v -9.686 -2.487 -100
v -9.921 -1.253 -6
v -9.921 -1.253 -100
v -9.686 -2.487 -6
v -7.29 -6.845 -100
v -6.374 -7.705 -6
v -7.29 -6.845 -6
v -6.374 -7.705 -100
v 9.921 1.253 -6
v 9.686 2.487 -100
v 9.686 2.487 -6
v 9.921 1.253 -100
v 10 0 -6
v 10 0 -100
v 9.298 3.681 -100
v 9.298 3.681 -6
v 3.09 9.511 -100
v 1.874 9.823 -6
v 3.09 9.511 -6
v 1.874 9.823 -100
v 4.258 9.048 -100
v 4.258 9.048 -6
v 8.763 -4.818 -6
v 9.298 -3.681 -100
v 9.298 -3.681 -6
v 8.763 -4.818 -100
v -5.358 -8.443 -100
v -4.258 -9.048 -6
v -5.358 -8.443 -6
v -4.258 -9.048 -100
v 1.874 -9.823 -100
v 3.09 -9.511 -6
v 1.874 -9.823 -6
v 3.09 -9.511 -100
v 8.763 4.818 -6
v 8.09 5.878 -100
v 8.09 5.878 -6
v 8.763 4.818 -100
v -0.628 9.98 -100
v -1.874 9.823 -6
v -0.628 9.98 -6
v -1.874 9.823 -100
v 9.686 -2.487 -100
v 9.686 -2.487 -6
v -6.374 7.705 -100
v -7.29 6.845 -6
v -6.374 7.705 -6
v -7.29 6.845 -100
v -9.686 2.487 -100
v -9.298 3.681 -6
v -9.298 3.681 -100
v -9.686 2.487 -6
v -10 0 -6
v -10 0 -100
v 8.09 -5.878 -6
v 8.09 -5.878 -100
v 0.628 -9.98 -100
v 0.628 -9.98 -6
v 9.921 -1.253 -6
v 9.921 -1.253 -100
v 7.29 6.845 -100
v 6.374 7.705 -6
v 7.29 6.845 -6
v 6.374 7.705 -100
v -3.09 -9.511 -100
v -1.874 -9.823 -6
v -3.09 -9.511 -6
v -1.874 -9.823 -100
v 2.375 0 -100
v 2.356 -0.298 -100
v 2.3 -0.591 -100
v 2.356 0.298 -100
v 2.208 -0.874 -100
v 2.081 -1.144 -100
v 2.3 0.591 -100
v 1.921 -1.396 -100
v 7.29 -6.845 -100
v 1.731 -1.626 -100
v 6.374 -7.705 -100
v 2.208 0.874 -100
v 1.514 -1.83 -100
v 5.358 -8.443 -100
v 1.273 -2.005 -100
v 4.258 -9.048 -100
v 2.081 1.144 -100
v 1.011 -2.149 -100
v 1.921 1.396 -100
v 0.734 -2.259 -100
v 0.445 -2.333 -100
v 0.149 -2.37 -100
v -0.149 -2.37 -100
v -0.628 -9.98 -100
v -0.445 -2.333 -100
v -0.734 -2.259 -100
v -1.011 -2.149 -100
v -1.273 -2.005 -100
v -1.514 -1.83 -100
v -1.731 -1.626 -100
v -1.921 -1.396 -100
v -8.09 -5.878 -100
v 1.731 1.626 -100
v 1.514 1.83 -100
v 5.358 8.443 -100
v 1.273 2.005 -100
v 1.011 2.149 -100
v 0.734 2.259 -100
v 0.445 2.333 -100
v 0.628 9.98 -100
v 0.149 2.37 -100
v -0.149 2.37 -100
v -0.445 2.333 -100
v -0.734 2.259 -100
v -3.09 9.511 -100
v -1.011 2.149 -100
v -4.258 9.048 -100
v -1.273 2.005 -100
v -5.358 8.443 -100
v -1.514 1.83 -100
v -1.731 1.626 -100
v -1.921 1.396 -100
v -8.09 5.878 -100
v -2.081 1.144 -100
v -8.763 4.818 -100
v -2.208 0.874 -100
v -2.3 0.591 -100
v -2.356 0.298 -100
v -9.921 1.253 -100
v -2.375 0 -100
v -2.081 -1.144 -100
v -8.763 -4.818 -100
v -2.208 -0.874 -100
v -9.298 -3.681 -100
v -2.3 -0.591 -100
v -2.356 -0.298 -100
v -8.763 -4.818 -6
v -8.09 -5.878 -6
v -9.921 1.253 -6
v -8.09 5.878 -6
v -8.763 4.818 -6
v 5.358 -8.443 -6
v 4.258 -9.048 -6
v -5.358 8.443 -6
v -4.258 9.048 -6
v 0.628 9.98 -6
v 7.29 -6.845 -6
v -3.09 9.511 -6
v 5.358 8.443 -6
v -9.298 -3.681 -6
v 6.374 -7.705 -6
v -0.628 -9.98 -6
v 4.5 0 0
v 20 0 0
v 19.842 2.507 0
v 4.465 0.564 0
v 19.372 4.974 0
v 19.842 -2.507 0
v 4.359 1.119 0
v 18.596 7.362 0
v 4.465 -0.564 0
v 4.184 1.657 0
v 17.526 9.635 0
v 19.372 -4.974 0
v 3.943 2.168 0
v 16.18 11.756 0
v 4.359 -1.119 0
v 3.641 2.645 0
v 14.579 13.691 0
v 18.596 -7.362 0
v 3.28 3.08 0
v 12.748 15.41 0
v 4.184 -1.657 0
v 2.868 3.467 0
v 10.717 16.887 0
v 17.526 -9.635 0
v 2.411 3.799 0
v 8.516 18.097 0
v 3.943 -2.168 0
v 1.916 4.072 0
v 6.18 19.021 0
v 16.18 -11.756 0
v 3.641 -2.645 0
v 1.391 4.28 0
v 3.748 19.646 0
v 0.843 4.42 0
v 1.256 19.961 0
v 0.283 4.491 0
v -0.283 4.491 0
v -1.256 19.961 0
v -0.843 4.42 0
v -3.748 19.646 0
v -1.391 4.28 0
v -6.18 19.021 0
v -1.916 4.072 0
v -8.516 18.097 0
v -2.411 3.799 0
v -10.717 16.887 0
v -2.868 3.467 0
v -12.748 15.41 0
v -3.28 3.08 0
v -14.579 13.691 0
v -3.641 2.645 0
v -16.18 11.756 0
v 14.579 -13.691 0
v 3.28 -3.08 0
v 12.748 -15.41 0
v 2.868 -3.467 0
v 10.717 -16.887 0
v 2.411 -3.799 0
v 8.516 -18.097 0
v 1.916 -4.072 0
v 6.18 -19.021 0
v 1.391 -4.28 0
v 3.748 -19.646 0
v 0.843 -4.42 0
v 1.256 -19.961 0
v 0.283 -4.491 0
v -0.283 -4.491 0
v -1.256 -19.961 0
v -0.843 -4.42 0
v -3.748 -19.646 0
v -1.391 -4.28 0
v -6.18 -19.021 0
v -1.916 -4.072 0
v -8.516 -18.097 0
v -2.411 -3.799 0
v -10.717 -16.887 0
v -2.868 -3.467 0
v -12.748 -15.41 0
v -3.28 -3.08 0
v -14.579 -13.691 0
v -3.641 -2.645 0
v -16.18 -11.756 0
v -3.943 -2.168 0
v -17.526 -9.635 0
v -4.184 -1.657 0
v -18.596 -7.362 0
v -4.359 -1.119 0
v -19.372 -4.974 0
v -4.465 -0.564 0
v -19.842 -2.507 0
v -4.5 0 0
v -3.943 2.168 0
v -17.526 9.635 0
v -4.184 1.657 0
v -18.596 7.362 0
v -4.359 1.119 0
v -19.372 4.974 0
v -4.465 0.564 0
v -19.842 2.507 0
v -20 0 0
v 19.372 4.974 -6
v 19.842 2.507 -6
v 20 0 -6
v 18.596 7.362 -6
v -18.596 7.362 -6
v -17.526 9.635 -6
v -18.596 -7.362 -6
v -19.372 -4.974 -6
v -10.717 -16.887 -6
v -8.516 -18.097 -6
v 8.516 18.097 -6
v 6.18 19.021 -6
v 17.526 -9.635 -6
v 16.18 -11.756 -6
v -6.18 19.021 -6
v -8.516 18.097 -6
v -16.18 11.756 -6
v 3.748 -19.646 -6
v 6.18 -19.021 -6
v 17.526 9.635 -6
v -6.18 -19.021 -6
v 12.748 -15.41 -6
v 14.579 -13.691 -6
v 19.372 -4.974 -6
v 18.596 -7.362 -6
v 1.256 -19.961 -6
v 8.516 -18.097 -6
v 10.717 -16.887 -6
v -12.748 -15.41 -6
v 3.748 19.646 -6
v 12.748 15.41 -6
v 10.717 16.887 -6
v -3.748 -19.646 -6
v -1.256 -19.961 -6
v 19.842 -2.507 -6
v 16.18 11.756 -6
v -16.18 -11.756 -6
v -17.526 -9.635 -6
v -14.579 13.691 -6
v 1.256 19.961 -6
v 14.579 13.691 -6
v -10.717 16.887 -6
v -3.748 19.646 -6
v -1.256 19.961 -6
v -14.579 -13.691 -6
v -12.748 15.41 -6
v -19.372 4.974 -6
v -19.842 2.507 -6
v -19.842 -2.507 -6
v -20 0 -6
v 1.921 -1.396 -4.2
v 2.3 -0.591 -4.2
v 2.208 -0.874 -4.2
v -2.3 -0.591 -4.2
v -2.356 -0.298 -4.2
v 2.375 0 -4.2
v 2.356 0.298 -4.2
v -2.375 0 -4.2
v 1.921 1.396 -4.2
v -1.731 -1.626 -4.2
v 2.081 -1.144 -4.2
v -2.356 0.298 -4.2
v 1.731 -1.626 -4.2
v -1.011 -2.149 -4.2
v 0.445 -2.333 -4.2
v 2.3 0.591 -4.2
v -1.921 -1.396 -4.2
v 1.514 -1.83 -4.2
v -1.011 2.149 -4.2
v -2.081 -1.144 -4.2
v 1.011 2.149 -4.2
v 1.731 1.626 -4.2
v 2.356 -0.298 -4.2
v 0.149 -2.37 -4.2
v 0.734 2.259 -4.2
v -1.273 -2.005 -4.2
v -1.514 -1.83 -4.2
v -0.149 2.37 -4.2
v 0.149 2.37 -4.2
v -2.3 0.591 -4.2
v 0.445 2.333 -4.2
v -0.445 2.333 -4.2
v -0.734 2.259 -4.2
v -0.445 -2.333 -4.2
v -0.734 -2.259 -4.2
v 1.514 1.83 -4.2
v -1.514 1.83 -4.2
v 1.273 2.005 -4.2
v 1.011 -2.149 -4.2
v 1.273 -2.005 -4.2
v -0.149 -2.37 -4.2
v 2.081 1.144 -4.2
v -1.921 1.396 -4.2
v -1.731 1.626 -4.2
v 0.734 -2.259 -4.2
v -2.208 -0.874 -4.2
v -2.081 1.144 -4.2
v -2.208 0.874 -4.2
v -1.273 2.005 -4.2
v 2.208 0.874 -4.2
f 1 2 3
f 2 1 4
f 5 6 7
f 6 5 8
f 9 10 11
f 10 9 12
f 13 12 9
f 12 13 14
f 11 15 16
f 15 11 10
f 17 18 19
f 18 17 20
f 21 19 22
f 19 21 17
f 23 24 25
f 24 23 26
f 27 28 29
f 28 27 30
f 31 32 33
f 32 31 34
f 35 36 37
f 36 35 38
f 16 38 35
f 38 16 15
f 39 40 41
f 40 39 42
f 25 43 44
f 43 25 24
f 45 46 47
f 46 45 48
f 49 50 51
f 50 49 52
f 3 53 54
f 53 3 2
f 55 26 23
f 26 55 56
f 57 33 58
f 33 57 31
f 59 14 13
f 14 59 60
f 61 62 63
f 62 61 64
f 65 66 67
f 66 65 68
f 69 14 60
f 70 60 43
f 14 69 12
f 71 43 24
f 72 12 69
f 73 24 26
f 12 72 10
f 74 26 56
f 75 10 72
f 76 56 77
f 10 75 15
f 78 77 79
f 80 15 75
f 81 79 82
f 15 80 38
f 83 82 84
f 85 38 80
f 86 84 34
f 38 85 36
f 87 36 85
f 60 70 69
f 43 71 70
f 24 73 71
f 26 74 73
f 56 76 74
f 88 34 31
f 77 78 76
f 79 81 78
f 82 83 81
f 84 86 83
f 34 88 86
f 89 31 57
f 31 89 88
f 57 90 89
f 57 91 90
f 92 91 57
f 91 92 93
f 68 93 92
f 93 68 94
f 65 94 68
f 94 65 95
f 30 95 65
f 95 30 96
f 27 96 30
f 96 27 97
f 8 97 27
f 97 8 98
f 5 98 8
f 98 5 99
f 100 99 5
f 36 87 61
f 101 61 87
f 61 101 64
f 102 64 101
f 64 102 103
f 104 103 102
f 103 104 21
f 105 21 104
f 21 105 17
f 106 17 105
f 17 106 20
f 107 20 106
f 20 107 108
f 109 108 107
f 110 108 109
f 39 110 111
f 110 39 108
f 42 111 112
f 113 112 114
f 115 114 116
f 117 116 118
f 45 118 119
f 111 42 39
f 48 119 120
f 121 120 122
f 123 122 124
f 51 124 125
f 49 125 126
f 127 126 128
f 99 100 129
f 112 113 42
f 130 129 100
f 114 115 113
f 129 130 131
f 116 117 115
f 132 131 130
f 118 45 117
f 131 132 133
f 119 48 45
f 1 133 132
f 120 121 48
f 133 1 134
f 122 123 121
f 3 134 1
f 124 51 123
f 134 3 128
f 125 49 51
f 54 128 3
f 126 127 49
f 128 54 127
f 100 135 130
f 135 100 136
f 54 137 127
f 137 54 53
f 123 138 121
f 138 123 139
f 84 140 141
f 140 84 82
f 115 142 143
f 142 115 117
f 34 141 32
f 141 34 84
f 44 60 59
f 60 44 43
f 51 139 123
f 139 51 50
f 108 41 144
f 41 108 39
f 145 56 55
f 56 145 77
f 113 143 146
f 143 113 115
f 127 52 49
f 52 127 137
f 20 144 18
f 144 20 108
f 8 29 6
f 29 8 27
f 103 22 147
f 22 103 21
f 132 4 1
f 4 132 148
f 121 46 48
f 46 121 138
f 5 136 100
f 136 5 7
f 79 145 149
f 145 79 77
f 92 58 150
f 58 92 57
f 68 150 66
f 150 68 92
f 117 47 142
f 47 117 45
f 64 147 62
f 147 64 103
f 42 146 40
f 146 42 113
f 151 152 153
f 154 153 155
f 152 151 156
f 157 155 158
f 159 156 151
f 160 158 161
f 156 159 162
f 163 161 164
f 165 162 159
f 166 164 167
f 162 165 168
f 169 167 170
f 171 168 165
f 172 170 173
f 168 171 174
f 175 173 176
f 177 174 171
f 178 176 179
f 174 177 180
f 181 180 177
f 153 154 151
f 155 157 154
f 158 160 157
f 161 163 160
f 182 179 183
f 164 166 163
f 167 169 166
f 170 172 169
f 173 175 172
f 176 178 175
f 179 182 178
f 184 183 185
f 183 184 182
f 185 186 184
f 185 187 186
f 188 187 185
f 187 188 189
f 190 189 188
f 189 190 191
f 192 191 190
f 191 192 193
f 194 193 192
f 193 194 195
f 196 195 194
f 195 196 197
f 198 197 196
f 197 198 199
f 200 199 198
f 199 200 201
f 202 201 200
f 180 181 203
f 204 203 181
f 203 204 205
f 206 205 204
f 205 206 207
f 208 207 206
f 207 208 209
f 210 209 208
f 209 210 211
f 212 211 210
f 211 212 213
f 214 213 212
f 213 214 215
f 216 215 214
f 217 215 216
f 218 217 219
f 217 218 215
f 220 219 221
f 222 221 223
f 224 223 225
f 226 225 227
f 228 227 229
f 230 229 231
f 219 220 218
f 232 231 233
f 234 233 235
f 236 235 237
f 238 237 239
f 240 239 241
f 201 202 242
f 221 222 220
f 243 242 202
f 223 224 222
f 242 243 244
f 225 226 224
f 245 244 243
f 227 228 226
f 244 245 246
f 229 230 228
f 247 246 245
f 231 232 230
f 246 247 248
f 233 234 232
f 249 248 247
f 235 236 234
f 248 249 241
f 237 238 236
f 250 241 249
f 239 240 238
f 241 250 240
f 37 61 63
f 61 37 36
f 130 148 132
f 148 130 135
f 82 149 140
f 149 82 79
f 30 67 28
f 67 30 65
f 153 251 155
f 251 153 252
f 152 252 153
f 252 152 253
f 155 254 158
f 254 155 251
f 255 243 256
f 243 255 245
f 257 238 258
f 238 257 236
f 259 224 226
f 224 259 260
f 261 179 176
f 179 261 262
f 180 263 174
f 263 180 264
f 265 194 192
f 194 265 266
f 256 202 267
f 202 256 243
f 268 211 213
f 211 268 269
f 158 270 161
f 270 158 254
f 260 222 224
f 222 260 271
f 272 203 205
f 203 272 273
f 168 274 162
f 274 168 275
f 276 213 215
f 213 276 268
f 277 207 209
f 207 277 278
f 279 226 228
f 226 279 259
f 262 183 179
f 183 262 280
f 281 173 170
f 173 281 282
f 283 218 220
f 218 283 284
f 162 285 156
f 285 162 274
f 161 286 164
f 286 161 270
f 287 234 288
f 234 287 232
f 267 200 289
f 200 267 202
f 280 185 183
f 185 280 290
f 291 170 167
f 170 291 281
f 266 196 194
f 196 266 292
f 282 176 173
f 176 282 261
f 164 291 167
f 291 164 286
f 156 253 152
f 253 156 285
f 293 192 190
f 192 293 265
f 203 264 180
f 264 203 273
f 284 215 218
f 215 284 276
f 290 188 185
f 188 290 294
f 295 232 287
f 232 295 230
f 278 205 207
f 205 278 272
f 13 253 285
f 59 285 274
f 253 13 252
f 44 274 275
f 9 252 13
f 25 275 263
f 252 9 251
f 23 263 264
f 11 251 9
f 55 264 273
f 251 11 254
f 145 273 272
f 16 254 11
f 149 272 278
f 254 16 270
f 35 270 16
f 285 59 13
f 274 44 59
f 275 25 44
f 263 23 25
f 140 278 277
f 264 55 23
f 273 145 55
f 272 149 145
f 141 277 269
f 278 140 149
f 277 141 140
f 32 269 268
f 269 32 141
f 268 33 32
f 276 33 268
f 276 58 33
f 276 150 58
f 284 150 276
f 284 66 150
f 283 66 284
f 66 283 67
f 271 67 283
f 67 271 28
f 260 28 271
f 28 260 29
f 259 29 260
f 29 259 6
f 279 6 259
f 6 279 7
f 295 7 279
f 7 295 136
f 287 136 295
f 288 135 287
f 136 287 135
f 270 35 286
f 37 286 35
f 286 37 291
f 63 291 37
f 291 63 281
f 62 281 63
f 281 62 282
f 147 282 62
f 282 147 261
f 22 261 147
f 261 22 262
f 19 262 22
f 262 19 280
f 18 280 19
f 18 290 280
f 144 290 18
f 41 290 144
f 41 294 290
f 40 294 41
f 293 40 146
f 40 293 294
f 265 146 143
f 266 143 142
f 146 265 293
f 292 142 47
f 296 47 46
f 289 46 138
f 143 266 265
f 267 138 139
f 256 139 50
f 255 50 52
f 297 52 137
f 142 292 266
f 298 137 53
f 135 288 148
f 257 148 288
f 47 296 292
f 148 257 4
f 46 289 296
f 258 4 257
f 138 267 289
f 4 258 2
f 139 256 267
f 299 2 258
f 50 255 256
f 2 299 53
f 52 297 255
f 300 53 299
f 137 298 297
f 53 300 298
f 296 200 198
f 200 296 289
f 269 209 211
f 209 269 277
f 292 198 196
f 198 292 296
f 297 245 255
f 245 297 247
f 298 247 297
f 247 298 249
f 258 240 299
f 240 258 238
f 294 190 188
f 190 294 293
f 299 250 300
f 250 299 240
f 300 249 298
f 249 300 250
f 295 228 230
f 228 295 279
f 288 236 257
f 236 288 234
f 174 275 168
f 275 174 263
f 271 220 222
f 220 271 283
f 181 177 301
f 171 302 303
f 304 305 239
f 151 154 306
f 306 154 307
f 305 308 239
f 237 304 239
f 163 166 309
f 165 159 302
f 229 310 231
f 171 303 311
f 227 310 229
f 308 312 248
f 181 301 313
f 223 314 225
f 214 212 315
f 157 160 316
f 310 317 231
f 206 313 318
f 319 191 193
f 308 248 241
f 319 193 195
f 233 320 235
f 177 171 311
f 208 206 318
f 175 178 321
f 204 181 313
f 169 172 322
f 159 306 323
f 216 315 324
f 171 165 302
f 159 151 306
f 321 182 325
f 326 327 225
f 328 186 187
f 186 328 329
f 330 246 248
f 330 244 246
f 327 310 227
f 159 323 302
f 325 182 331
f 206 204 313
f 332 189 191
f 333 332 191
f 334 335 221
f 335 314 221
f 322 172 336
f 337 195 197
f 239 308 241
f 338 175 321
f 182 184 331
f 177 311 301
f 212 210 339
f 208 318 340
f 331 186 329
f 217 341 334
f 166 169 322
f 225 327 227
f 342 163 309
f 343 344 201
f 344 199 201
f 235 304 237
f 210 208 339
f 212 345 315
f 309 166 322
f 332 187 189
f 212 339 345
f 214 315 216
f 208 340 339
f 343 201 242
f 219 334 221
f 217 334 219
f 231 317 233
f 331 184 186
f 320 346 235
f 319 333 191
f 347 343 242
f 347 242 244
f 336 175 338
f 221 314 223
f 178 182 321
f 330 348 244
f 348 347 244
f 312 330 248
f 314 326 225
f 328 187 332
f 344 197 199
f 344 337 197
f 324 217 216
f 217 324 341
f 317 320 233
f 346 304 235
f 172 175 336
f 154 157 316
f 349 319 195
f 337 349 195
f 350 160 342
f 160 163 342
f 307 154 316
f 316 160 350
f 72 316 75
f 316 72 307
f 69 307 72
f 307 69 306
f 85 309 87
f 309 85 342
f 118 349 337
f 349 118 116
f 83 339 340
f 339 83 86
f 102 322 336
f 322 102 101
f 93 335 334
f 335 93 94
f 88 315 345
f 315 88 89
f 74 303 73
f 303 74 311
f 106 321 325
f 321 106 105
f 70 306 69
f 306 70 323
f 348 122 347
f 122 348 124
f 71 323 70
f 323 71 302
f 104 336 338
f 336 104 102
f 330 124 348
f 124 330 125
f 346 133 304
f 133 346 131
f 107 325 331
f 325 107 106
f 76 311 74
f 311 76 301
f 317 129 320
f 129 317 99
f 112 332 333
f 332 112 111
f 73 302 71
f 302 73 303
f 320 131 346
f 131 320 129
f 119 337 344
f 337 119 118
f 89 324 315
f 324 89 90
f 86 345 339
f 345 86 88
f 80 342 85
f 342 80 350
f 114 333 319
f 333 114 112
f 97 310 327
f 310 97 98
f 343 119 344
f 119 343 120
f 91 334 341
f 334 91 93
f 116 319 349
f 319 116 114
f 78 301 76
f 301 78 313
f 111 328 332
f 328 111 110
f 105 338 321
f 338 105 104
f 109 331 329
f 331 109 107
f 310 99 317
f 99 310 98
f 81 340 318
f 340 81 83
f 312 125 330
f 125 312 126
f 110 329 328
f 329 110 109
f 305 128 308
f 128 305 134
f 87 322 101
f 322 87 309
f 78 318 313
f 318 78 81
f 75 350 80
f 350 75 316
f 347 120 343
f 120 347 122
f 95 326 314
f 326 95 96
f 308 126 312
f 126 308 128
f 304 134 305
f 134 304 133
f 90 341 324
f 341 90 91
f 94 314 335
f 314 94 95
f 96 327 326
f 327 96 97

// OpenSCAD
$fn = 50;


difference() {
	union() {
		translate(v = [0, 0, -100.0000000000]) {
			cylinder(h = 100, r = 10.0000000000);
		}
		translate(v = [0, 0, -6.0000000000]) {
			cylinder(h = 6, r = 20.0000000000);
		}
	}
	union() {
		translate(v = [0, 0, 0]) {
			rotate(a = [0, 0, 0]) {
				difference() {
					union() {
						#translate(v = [0, 0, -100.0000000000]) {
							cylinder(h = 100, r = 2.2500000000);
						}
						#translate(v = [0, 0, -4.2000000000]) {
							cylinder(h = 4.2000000000, r1 = 2.3750000000, r2 = 4.5000000000);
						}
						#translate(v = [0, 0, -100.0000000000]) {
							cylinder(h = 100, r = 2.3750000000);
						}
						#translate(v = [0, 0, -100.0000000000]) {
							cylinder(h = 100, r = 2.2500000000);
						}
					}
					union();
				}
			}
		}
	}
}
